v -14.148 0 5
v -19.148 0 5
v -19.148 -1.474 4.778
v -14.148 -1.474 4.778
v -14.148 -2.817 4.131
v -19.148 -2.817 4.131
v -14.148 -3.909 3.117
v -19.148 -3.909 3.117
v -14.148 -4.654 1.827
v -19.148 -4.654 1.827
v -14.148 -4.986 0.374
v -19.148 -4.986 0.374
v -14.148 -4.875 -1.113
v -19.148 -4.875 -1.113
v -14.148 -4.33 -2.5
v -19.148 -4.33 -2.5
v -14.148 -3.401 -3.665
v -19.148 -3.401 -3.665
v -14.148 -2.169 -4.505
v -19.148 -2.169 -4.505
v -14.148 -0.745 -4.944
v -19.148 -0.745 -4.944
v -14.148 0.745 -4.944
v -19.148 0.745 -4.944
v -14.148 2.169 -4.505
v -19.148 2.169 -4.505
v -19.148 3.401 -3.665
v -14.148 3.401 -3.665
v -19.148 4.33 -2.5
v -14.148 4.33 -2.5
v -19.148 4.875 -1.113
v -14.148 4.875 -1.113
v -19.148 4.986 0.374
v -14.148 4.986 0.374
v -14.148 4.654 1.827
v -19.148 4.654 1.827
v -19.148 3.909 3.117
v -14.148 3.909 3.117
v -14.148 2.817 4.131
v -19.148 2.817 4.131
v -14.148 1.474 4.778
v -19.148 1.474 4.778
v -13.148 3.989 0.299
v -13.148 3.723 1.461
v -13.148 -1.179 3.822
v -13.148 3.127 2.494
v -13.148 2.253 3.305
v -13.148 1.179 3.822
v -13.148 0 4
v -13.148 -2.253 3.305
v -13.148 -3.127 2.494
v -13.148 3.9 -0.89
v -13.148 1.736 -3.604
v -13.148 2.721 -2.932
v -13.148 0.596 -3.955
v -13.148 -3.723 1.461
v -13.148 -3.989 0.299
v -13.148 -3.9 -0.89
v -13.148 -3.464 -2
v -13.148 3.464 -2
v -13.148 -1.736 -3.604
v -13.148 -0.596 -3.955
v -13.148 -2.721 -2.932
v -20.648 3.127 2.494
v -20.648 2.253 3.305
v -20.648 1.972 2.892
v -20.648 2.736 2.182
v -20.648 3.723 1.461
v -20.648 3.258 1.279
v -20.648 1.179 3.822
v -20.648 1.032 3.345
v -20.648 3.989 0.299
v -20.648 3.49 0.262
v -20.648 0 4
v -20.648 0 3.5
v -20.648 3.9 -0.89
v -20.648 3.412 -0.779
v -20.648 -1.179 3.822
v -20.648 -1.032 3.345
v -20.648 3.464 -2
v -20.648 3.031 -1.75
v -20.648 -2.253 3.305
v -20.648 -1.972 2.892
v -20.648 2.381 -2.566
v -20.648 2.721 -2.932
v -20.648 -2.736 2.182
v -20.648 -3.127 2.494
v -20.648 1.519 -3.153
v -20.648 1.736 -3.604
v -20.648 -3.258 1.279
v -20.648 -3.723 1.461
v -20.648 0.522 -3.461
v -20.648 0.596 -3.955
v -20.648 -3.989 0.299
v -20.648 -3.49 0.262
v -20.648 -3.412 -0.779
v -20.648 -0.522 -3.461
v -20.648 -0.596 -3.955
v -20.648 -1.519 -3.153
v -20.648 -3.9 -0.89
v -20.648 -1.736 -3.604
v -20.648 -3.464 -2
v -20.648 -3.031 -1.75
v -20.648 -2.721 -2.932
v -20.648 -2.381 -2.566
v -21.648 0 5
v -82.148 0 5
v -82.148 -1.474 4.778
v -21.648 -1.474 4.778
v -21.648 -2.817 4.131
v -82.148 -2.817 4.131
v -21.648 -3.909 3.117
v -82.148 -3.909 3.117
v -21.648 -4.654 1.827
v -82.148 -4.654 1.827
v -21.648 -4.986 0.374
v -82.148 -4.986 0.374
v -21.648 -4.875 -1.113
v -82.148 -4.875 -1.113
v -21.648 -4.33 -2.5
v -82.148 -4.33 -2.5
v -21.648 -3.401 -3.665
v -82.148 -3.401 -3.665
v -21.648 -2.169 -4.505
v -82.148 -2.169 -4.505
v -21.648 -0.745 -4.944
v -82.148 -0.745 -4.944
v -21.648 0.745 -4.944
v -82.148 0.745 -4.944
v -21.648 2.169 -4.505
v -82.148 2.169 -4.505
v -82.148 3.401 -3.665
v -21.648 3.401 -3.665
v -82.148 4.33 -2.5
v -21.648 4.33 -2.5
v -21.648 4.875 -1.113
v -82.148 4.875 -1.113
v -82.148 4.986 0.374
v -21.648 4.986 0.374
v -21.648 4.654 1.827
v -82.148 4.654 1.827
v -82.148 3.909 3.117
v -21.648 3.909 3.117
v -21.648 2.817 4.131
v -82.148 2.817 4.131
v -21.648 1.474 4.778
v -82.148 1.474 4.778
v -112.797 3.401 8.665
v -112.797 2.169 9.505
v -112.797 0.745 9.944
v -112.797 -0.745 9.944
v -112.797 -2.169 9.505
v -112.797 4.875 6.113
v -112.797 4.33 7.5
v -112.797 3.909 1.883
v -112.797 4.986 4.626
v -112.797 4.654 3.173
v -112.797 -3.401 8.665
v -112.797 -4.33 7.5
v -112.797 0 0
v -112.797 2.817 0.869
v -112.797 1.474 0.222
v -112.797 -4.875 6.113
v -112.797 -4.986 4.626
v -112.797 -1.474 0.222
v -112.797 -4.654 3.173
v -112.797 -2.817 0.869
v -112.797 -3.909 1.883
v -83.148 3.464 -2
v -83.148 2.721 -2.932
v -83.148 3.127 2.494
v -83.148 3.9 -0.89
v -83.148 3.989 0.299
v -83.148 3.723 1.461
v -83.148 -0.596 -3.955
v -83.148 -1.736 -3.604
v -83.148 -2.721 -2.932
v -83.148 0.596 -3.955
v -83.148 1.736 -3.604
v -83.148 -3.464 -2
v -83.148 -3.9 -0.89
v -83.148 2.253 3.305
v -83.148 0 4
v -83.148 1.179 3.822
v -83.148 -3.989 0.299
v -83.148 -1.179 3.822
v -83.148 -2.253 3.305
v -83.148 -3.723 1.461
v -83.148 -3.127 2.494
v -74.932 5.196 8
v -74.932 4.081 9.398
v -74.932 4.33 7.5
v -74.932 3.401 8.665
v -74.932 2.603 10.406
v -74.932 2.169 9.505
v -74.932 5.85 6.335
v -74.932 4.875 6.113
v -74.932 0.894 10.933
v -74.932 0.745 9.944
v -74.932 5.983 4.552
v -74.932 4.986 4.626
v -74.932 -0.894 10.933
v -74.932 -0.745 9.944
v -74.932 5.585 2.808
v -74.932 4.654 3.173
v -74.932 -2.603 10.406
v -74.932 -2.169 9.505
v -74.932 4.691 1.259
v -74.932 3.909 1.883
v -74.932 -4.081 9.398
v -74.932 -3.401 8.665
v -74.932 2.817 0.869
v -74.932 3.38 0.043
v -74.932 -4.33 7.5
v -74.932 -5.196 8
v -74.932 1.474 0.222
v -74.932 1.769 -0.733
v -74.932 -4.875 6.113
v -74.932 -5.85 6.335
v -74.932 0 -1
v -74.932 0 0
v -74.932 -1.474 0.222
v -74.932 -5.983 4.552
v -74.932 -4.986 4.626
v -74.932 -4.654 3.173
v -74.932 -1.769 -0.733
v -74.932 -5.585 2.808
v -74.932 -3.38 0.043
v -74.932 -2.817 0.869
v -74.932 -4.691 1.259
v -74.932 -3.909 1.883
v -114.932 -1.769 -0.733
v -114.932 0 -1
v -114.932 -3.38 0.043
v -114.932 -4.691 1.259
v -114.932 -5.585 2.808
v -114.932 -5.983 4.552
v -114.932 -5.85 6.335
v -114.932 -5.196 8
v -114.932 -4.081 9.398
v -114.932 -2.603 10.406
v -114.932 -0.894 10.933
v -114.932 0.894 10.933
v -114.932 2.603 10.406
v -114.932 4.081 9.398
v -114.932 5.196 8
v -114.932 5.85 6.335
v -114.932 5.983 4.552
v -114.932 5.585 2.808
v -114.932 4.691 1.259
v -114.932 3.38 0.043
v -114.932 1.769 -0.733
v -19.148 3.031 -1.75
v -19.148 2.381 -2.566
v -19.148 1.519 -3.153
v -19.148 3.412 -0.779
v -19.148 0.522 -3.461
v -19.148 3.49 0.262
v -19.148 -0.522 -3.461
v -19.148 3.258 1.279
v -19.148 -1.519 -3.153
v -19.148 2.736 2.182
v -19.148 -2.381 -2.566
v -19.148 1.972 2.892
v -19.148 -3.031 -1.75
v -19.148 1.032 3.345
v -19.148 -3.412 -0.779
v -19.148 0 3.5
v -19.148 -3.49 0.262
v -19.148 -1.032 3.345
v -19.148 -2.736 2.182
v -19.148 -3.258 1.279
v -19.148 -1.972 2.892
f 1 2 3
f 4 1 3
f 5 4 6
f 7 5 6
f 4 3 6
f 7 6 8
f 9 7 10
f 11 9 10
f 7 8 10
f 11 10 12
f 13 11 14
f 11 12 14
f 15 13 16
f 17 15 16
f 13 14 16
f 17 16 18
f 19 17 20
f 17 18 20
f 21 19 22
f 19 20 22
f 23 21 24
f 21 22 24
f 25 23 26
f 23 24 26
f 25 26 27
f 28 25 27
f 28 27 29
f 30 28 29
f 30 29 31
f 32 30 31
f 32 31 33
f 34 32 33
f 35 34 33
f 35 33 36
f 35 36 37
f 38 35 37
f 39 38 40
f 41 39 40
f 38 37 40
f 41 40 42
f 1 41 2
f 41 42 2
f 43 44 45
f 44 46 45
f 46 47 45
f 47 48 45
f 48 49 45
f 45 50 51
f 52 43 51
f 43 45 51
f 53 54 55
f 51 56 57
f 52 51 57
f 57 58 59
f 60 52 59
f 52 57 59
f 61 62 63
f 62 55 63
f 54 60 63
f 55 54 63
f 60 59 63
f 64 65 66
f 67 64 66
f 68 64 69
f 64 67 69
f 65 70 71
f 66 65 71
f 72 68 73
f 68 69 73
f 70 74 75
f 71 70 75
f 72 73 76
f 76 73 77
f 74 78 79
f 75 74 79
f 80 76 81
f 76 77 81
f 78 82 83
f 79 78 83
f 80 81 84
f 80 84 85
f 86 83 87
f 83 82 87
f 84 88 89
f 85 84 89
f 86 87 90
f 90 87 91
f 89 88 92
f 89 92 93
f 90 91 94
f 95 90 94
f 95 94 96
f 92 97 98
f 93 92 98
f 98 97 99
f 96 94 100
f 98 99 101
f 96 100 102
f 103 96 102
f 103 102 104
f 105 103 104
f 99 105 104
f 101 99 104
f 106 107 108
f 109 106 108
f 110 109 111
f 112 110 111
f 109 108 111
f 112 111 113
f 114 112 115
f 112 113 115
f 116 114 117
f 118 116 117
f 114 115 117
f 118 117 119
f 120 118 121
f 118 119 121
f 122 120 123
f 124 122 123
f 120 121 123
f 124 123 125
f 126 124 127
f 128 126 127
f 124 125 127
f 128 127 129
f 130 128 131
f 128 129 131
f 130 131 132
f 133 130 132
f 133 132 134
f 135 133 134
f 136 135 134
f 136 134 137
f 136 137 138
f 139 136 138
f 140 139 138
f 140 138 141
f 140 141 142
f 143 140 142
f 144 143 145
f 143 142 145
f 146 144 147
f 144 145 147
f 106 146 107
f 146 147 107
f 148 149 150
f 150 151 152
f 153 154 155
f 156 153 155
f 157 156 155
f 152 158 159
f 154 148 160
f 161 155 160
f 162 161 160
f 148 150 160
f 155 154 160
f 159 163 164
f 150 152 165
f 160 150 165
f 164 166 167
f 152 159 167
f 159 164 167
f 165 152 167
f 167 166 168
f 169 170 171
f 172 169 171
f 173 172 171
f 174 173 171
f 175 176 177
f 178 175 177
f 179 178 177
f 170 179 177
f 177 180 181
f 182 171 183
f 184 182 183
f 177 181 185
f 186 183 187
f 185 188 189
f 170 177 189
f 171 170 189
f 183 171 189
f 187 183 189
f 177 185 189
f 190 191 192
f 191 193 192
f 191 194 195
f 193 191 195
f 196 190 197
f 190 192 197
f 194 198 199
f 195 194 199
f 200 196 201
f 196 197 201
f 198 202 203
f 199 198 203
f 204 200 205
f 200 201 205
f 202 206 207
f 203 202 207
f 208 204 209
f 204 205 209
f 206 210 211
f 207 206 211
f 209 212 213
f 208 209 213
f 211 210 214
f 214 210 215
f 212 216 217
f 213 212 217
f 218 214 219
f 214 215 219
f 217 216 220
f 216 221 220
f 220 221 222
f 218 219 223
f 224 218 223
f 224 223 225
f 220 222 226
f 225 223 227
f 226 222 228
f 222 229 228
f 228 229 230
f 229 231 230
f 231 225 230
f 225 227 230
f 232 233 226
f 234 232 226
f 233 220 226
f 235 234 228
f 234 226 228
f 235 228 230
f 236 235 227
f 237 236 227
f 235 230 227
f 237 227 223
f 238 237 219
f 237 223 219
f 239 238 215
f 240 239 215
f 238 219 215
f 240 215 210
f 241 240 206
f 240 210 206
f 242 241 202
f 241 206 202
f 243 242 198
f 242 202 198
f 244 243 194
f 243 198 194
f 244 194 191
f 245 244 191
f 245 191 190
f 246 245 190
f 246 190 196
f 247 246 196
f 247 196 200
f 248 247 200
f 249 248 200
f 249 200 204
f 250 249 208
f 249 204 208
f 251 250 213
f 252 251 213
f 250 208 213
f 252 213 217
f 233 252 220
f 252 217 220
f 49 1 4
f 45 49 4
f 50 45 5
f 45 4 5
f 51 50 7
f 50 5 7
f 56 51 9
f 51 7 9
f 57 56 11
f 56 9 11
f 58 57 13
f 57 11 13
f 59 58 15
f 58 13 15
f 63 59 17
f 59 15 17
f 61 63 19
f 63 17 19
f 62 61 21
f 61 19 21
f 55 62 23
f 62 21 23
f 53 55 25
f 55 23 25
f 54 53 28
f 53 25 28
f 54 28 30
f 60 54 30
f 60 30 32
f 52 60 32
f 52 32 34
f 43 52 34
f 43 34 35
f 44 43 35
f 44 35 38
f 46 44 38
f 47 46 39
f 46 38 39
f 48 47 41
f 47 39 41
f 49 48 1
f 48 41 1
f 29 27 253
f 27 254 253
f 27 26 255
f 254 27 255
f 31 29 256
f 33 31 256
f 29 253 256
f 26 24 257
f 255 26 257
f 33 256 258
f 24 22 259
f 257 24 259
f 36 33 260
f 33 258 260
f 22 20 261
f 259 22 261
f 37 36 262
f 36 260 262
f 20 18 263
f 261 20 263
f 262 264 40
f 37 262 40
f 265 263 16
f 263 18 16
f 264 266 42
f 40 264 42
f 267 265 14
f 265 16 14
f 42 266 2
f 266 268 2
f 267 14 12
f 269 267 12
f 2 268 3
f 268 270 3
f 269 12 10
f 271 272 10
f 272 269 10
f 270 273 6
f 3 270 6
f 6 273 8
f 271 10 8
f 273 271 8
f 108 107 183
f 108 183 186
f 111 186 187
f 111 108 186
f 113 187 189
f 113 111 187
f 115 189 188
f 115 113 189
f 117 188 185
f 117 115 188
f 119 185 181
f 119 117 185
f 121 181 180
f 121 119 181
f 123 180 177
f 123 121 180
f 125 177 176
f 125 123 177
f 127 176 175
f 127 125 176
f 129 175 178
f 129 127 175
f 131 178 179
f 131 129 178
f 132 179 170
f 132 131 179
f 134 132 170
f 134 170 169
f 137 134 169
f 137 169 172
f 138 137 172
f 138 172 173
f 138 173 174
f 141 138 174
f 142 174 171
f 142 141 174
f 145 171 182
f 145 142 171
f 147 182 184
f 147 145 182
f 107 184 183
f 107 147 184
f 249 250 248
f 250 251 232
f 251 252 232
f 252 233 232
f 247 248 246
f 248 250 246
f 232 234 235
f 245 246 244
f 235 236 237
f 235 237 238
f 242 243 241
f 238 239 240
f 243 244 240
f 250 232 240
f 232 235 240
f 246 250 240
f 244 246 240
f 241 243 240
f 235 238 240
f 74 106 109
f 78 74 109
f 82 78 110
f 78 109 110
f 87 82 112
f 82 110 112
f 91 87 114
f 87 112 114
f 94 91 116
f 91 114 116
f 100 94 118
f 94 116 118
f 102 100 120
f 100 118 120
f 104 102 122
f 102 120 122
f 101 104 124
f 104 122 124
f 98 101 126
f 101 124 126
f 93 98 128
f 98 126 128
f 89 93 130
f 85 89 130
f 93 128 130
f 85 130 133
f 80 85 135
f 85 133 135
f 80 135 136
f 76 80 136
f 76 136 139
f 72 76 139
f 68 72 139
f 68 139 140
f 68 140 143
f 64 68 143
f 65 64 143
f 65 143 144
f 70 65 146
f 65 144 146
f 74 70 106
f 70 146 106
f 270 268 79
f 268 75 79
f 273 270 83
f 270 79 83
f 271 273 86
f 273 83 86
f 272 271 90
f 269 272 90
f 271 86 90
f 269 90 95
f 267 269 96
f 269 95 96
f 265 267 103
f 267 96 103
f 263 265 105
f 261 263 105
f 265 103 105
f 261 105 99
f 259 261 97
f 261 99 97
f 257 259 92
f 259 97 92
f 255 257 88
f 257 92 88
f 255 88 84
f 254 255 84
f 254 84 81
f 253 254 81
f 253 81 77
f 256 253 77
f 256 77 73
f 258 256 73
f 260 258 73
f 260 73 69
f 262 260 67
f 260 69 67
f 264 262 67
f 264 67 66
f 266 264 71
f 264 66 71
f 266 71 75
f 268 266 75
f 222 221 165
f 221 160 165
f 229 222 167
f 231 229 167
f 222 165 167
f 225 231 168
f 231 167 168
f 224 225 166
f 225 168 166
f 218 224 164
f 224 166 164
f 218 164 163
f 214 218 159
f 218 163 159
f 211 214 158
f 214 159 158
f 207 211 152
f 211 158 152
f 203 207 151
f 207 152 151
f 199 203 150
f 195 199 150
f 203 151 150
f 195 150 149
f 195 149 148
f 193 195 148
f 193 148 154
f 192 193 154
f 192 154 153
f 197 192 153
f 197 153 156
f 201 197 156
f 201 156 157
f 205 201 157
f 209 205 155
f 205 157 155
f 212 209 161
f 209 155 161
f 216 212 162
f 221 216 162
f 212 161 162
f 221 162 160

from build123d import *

# Parameters (mm, degrees)
F2_SIZE = 1


with BuildPart() as f1:
    # F0 (on Front) → F1 (revolve)
    with BuildSketch(Plane.XZ):
        Polygon((-83.1480100751, 5), (-83.1480100751, 0), (-74.9320751429, 0), (-13.1480100751, 0), (-13.1480100751, 5), (-19.1480100751, 5), (-19.1480100751, 3.5), (-20.6480100751, 3.5), (-20.6480100751, 5), (-74.9320751429, 5), align=None)
    revolve(axis=Axis((-48.1480100751, 0, 0), (1, 0, 0)))

    # F2
    f2_edges = [f1.edges().sort_by_distance(p)[0] for p in [
        (-13.14801, 0, -5),
        (-20.64801, 0, -5),
        (-83.14801, 0, -5),
    ]]
    chamfer(f2_edges, length=F2_SIZE)


with BuildPart() as f3:
    # F0 (on Front) → F3 (revolve)
    with BuildSketch(Plane.XZ):
        Polygon((-74.9320751429, 0), (-83.1480100751, 0), (-112.7974465489, 0), (-112.7974465489, -1), (-74.9320751429, -1), align=None)
        Polygon((-112.7974465489, -1), (-112.7974465489, 0), (-112.7974465489, 5), (-114.9320751429, 5), (-114.9320751429, 0), (-114.9320751429, -1), align=None)
    revolve(axis=Axis((-94.9320751429, 0, 5), (-1, 0, 0)))


solid = Compound([f1.part, f3.part])
